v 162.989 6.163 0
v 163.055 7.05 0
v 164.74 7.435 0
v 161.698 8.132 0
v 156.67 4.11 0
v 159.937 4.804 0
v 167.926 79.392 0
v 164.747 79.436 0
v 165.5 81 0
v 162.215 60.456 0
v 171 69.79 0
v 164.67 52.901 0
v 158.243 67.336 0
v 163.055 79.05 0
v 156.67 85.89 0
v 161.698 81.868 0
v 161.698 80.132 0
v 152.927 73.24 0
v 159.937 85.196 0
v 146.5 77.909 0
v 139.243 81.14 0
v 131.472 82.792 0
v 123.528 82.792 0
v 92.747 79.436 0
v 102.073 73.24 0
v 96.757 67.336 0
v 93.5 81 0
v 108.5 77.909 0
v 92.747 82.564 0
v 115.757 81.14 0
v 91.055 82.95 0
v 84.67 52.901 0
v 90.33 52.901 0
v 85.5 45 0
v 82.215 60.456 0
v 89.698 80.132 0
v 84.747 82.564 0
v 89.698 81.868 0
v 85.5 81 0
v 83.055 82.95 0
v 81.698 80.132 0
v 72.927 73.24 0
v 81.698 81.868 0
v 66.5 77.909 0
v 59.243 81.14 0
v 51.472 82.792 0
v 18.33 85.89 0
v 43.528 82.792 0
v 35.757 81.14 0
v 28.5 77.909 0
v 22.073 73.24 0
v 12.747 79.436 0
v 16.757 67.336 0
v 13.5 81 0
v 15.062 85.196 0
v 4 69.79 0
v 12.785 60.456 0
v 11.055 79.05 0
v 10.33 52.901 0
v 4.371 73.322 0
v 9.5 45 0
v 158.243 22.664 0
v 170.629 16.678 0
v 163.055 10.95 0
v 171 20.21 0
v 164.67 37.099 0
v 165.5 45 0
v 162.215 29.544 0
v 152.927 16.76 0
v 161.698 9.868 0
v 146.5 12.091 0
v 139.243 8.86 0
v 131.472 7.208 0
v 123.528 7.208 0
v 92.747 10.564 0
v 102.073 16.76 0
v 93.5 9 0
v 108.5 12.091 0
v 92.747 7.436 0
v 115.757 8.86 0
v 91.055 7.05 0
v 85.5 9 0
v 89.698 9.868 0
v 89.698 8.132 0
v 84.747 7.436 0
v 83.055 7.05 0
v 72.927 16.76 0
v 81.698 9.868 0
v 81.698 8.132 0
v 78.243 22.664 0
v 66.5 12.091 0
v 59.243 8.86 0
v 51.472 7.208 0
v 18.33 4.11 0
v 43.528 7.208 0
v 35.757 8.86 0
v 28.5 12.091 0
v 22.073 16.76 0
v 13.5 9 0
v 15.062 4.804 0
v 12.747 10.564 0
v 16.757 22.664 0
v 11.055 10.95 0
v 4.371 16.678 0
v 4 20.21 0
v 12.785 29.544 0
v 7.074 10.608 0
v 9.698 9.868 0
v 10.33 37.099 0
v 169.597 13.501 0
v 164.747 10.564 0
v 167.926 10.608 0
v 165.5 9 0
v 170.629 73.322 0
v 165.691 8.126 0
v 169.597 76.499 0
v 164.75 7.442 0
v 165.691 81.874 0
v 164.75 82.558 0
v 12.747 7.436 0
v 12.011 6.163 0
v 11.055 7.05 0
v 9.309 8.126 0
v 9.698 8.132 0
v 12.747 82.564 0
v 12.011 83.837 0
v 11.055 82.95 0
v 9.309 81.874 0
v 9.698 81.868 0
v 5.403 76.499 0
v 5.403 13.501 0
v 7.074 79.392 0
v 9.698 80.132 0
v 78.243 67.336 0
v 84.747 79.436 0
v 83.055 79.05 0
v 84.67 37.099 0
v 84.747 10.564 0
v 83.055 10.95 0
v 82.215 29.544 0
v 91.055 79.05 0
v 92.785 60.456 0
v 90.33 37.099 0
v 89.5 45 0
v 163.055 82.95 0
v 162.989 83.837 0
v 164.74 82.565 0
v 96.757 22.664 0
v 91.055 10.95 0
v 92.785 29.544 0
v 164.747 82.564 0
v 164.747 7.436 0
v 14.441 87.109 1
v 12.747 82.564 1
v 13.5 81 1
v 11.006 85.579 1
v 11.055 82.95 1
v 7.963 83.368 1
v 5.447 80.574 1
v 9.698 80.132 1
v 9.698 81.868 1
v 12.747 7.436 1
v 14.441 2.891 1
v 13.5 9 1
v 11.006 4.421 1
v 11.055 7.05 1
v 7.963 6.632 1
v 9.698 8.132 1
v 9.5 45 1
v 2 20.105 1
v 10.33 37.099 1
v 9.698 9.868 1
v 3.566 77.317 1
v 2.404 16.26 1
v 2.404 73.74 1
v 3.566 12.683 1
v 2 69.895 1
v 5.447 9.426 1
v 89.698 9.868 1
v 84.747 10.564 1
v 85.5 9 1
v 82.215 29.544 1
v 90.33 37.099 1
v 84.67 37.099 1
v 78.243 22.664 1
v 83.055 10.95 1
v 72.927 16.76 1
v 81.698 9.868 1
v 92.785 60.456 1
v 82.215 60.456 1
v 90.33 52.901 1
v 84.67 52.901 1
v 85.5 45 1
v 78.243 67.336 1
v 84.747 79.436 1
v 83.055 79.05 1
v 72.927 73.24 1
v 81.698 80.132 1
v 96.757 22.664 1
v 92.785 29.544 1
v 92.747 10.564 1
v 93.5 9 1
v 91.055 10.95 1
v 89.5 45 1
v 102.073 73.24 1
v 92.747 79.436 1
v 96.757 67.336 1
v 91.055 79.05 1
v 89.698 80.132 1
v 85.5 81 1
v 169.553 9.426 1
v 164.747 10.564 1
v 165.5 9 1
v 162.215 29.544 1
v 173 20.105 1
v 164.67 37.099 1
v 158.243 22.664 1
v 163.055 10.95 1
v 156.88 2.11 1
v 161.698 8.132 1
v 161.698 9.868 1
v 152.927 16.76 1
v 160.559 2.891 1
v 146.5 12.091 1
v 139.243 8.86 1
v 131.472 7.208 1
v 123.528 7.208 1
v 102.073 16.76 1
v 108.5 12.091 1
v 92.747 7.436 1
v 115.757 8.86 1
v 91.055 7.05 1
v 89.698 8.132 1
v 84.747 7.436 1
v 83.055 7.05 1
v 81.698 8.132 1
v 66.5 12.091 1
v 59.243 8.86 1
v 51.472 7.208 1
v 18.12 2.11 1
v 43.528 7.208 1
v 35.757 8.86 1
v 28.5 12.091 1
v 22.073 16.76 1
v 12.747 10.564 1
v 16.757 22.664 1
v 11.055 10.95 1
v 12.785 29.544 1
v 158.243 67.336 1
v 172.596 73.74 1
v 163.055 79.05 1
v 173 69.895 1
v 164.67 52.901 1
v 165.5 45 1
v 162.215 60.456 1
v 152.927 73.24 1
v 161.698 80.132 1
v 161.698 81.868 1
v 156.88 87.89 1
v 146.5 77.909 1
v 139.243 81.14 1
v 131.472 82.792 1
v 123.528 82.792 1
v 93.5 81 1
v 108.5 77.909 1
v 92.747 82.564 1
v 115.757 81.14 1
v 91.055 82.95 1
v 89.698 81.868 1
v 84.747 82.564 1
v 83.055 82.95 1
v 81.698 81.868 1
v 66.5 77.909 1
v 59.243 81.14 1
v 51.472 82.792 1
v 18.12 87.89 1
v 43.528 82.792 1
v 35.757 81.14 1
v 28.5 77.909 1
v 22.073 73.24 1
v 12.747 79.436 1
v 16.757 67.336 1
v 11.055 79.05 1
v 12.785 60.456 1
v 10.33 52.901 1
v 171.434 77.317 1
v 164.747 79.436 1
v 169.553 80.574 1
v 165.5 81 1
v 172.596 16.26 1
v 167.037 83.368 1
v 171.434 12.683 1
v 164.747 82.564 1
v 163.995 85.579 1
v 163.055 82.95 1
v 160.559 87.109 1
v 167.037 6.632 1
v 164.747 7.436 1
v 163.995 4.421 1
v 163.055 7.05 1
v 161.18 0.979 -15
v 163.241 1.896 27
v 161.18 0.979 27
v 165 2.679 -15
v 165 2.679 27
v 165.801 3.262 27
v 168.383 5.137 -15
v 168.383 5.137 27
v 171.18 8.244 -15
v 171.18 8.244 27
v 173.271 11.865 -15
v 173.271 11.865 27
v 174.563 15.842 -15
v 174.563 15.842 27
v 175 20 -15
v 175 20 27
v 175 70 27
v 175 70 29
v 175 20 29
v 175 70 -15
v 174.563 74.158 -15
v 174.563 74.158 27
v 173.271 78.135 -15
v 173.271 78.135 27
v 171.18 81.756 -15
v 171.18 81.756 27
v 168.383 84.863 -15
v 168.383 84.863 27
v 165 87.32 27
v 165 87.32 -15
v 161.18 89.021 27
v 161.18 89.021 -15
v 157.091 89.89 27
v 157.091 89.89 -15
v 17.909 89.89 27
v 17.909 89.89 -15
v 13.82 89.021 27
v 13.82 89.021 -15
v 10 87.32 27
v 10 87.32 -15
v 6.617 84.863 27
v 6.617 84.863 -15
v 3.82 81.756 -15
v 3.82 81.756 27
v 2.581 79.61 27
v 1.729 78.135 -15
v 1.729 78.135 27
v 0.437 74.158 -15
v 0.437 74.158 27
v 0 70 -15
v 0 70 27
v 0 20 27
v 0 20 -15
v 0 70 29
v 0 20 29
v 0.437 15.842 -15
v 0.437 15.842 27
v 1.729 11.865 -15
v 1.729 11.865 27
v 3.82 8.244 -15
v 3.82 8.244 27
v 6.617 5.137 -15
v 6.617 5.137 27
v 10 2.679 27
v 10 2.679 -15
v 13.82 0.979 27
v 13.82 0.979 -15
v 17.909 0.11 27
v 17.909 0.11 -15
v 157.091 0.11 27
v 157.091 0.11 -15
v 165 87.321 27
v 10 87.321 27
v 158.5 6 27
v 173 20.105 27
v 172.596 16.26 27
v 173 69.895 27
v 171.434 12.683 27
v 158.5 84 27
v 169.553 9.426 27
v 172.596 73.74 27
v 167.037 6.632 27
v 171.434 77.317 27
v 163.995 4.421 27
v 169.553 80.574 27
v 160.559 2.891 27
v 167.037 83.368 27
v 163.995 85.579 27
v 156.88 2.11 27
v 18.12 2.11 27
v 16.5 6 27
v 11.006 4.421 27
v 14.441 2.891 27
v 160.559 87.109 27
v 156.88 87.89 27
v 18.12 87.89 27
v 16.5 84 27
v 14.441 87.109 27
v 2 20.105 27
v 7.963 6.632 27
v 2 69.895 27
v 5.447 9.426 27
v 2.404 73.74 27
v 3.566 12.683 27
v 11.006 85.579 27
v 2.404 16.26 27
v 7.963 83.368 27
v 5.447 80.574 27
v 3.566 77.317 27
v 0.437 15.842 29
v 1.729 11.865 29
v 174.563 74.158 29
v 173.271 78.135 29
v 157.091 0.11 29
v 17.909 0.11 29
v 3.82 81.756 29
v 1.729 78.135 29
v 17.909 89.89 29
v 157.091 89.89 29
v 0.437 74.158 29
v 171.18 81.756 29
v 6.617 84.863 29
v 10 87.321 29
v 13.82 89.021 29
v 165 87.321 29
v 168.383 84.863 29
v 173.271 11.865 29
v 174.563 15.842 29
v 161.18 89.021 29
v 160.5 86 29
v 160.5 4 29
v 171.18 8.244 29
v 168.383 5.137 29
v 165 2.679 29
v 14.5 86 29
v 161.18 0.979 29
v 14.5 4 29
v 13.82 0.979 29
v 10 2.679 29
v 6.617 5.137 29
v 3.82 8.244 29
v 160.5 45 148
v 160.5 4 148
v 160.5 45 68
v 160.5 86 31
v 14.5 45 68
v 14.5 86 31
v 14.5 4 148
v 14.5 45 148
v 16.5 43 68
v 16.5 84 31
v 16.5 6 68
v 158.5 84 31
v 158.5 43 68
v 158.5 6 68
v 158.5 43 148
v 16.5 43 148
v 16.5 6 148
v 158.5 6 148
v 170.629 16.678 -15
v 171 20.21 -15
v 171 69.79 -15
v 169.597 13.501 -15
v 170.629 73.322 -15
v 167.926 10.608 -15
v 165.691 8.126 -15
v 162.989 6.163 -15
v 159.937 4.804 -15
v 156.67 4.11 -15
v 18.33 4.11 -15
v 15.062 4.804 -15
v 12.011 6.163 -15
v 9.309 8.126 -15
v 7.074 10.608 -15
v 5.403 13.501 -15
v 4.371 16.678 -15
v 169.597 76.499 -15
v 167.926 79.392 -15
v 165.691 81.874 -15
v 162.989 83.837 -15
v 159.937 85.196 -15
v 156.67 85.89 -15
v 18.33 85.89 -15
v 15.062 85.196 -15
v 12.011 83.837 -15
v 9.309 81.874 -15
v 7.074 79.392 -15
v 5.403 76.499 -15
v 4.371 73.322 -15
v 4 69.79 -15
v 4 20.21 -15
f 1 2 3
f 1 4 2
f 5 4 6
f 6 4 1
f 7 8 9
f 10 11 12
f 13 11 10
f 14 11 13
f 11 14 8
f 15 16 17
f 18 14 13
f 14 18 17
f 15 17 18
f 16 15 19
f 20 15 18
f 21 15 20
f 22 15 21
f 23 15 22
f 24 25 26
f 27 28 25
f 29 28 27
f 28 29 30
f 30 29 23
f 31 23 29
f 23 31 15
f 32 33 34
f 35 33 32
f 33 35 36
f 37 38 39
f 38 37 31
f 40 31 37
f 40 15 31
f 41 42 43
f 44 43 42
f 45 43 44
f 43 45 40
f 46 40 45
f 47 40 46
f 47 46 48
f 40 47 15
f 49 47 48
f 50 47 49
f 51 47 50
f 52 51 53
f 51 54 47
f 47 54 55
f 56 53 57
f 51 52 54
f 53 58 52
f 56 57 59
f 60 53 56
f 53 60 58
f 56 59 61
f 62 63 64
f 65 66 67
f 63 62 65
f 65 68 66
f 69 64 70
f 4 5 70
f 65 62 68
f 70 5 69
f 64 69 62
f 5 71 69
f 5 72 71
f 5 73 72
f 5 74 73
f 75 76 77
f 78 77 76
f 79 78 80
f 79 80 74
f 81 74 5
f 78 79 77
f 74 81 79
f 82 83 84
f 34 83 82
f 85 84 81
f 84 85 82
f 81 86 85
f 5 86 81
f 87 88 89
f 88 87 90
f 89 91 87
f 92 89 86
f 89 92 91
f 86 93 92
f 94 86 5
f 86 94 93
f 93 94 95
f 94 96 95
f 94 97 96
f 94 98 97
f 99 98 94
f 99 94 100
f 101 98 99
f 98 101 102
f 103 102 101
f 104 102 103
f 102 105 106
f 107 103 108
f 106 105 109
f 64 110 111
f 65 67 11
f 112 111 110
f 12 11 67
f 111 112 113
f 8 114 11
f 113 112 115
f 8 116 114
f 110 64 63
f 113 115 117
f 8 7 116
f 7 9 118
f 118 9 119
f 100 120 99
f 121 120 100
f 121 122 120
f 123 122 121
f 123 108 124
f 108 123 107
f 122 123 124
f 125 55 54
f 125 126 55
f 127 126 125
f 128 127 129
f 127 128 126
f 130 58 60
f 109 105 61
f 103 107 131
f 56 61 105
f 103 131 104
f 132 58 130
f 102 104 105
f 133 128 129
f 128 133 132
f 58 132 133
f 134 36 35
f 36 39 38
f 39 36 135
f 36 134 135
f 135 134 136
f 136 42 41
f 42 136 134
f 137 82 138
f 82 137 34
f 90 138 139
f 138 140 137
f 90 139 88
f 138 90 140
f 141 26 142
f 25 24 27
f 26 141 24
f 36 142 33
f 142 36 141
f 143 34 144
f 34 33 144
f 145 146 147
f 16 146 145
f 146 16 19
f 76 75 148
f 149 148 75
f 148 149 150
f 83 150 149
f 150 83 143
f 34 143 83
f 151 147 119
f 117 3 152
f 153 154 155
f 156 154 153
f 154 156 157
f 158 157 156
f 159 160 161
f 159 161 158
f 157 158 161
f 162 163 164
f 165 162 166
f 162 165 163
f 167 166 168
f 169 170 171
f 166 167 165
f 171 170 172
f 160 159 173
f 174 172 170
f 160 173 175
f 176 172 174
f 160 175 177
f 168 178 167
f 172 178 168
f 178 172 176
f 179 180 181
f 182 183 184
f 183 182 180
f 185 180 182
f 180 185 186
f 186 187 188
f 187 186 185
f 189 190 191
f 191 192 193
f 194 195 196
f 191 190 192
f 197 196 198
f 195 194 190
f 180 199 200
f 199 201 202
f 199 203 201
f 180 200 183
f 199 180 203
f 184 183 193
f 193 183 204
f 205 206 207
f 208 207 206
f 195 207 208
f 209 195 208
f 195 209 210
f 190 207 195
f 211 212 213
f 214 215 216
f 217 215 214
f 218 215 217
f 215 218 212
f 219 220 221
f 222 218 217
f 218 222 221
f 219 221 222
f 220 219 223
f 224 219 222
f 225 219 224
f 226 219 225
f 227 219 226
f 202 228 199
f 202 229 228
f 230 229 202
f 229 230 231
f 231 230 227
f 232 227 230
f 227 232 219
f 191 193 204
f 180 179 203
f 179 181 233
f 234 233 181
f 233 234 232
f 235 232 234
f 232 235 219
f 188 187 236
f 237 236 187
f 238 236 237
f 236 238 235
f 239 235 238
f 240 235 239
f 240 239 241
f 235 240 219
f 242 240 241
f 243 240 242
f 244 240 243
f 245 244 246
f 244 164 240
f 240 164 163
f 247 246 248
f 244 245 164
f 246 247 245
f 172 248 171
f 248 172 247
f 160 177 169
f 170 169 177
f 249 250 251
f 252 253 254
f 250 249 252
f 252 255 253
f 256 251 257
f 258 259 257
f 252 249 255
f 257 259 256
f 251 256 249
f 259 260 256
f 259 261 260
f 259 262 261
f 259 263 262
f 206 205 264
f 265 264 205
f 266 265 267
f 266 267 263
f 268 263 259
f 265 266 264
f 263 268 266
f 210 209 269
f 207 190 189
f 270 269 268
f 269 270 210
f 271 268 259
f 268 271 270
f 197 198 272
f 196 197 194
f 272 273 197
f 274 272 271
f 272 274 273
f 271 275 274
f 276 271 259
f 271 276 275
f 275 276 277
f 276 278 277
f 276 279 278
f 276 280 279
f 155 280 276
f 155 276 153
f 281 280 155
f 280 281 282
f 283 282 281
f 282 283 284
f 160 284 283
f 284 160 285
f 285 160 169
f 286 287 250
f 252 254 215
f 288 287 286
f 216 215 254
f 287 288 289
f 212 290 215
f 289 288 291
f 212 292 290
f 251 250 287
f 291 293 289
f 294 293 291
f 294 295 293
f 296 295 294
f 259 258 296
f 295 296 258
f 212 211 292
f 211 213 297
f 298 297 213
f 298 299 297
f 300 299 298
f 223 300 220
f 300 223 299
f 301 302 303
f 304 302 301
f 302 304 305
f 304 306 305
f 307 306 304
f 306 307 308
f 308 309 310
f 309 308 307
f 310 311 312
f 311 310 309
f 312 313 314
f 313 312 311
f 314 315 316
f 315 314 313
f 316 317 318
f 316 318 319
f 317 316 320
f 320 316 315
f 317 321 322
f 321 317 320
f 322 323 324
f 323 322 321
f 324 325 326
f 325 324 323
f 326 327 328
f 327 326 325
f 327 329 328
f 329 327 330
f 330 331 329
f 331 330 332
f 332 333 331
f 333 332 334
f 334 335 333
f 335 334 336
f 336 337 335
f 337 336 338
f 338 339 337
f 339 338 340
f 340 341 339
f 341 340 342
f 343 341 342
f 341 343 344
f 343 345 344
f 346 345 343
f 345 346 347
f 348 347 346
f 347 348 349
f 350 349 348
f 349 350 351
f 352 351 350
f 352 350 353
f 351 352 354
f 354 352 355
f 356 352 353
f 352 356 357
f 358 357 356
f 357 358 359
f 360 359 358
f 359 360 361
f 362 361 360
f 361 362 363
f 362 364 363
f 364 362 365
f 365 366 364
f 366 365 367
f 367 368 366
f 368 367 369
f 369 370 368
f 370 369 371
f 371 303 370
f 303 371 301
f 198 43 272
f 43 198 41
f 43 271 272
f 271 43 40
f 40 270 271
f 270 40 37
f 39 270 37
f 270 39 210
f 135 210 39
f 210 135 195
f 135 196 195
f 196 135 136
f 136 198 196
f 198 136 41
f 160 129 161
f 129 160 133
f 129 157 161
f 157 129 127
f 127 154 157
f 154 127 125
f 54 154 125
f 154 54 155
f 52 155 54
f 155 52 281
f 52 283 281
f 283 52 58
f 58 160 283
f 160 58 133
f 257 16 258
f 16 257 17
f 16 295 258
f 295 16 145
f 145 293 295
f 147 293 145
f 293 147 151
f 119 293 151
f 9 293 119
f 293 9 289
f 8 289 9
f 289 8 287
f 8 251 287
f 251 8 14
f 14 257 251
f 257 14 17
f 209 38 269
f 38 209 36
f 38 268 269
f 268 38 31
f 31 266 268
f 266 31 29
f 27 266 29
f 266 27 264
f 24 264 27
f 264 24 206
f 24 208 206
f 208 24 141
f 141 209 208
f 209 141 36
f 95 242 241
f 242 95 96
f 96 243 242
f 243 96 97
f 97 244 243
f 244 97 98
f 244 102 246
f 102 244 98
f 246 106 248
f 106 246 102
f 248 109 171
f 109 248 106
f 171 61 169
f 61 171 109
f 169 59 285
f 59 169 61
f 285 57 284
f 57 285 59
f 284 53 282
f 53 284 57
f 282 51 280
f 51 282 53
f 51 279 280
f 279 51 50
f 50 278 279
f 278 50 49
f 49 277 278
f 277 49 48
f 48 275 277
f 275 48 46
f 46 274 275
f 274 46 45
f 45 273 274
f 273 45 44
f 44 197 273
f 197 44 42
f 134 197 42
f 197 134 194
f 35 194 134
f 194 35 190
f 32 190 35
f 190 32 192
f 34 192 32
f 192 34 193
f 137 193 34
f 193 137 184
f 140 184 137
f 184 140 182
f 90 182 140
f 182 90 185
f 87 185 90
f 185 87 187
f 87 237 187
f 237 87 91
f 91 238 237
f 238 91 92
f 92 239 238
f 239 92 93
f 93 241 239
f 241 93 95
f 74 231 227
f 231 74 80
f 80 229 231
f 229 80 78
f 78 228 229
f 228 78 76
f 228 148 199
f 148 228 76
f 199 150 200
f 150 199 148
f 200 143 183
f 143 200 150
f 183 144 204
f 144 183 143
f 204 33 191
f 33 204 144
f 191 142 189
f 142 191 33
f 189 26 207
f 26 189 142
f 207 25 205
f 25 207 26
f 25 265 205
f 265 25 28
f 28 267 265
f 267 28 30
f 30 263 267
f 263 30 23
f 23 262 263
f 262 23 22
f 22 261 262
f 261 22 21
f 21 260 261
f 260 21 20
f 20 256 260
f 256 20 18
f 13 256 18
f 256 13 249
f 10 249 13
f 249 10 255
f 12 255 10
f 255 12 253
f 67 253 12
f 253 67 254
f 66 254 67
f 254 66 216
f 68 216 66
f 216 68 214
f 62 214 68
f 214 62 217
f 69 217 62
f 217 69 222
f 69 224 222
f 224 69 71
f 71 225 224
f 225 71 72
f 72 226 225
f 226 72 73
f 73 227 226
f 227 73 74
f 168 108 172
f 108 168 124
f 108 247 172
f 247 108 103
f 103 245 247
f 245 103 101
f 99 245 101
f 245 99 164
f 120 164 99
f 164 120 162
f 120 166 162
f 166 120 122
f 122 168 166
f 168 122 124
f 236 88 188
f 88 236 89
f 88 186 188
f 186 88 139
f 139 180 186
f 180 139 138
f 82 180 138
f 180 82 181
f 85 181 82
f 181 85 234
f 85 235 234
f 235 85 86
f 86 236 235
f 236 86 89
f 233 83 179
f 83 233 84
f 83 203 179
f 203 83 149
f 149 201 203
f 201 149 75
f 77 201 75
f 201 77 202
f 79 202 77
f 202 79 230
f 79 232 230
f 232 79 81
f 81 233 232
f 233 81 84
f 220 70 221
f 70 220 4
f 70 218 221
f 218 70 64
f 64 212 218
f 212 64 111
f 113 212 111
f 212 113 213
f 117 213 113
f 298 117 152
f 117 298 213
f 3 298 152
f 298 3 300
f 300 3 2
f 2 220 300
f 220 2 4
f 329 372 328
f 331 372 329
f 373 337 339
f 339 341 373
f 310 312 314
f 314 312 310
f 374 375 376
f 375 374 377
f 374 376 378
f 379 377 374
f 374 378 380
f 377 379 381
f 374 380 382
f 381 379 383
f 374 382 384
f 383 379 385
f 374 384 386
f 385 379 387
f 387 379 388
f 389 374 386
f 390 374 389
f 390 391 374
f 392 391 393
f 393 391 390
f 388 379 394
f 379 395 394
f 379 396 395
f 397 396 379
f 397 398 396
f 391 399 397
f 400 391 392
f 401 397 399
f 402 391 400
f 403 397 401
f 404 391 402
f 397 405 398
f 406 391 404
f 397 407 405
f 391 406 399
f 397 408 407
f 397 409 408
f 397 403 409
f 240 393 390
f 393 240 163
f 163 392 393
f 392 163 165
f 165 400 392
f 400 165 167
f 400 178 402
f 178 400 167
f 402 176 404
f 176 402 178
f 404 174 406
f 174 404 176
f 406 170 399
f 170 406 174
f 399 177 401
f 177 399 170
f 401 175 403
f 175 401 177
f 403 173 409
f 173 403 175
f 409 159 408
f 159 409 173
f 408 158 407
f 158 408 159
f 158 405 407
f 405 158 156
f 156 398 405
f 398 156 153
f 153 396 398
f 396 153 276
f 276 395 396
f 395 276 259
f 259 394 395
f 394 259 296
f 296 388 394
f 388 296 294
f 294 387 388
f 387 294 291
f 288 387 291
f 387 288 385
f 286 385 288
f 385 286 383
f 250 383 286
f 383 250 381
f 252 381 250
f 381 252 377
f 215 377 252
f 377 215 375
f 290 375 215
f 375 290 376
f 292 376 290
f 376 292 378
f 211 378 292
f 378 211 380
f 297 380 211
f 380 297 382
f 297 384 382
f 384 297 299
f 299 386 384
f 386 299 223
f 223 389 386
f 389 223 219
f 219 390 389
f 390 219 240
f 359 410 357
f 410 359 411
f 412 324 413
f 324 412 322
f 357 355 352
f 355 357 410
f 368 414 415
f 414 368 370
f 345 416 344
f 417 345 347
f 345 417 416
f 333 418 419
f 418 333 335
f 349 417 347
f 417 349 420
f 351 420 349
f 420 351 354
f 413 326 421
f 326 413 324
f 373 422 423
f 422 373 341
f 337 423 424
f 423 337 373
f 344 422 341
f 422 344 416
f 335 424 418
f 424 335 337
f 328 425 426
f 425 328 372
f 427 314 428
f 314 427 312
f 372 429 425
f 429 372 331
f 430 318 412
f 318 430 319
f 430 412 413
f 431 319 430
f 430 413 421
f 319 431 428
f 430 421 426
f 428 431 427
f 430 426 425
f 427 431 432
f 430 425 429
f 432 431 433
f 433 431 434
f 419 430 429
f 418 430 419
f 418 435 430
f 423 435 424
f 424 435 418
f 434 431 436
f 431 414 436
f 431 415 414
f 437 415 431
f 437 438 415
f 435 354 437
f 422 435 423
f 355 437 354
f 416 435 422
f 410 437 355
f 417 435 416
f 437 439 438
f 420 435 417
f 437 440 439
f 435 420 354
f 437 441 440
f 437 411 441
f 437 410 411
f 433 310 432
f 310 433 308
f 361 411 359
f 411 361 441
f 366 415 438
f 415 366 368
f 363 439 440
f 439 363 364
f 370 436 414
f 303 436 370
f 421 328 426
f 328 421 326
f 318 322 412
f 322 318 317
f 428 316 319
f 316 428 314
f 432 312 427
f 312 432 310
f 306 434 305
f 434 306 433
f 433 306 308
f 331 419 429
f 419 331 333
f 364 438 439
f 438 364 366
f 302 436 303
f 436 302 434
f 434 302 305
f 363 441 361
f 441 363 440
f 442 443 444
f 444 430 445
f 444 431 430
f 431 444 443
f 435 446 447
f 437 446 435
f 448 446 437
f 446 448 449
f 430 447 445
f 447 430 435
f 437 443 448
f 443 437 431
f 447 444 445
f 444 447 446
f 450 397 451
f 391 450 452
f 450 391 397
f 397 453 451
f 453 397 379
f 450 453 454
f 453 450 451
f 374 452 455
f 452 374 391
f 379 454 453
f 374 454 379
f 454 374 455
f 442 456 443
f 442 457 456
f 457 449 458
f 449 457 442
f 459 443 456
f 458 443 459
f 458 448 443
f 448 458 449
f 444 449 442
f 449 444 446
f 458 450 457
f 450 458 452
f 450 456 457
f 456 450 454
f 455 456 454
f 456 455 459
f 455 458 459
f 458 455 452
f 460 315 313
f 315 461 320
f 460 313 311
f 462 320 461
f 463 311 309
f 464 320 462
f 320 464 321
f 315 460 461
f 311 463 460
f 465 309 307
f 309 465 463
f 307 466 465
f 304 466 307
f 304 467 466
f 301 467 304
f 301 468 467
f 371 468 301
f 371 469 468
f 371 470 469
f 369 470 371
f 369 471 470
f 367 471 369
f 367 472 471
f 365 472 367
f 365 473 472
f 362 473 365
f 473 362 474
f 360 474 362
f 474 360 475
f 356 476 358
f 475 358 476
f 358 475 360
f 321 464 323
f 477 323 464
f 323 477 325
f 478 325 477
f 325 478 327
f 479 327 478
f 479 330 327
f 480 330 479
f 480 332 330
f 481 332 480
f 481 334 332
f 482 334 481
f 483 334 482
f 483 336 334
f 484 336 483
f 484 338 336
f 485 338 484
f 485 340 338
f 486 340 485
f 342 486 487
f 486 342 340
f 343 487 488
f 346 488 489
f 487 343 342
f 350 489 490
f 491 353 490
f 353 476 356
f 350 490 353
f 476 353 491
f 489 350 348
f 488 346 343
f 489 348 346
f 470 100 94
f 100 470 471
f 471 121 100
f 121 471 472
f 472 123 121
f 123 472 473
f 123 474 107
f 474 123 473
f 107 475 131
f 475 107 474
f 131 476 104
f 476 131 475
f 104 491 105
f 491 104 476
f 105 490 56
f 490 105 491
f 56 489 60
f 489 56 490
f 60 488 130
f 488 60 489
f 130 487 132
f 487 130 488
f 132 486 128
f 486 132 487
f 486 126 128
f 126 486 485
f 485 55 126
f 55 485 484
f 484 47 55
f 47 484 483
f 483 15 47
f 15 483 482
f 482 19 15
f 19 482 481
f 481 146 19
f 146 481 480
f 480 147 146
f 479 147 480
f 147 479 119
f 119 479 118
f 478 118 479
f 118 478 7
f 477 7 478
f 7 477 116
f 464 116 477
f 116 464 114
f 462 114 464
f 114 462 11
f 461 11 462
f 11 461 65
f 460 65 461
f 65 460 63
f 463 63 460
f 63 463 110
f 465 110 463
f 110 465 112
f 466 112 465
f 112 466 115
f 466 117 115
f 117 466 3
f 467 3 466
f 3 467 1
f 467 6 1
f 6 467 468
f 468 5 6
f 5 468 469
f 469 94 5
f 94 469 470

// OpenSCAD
blower_prumer=90;
vyska_ventilatoru=27;
prumer_zahybu=20;
blower_sirka=175;
blower_vyska=90;
screw_spacing=71.5;
blizenci=2;
bay_sirka=146;
bay_vyska=41;
brim=15;

module blower_plate(){
    hull(){ //blower plate
        translate([prumer_zahybu,prumer_zahybu,0])circle(prumer_zahybu);
        translate([blower_sirka-prumer_zahybu,prumer_zahybu,0])circle(prumer_zahybu);
        translate([prumer_zahybu,blower_vyska-prumer_zahybu,0])circle(prumer_zahybu);
        translate([blower_sirka-prumer_zahybu,blower_vyska-prumer_zahybu,0])circle(prumer_zahybu);
    }
}

module fan_hole(){
    translate([40,40,0])circle(38);
    translate([4,4,0])circle(2); //I AM SAD
    translate([76,4,0])circle(2);
    translate([76,76,0])circle(2);
    translate([4,76,0])circle(2);
}

module intake_brim(){
    translate([0,0,-brim]){
        linear_extrude(brim){
            difference(){
                blower_plate();
                offset(-4) {
                    blower_plate();
                }
            }
        }
    }
}

module zaklad(){
    linear_extrude(1){
        difference() {
            blower_plate();
            translate([blower_sirka/2-80,5,0])fan_hole(); //x-80 zajisti zarovnaní 1. díry ke středu
            translate([blower_sirka/2,5,0])fan_hole(); //y=5 protože (blower_vyska-fan_hole)/2
        }
    }

    linear_extrude(vyska_ventilatoru){
        difference(){
            blower_plate();
            offset(-2) {
                blower_plate();
            }
        }
    }
}

module backing(){
    difference(){
        translate([0,0,vyska_ventilatoru]){
            linear_extrude(2){
                blower_plate();
            }
        }
        translate([blower_sirka/2,blower_vyska/2,vyska_ventilatoru])cube([bay_sirka, 2*bay_vyska,4],center=true);
    }
}

module komin(){
    difference(){
        hull(){
            translate([blower_sirka/2,blower_vyska/2,vyska_ventilatoru+2])cube([bay_sirka, 2*bay_vyska,4],center=true);
            translate([blower_sirka/2,blower_vyska/2-bay_vyska/2,vyska_ventilatoru+40])cube([bay_sirka,bay_vyska,2],center=true);
        }
        hull(){
            translate([blower_sirka/2,blower_vyska/2,vyska_ventilatoru+2])cube([bay_sirka-4, 2*bay_vyska-4,4],center=true);
            translate([blower_sirka/2,blower_vyska/2-bay_vyska/2,vyska_ventilatoru+40])cube([bay_sirka-4,bay_vyska-4,2],center=true);
        }
    }
    translate([0,0,vyska_ventilatoru+41])linear_extrude(80){
        difference(){
            translate([blower_sirka/2,blower_vyska/2-bay_vyska/2,0])square([bay_sirka,bay_vyska],center=true);
            offset(-2){translate([blower_sirka/2,blower_vyska/2-bay_vyska/2,0])square([bay_sirka,bay_vyska],center=true);}
        }
    }
}

zaklad();
intake_brim();
backing();
komin();
